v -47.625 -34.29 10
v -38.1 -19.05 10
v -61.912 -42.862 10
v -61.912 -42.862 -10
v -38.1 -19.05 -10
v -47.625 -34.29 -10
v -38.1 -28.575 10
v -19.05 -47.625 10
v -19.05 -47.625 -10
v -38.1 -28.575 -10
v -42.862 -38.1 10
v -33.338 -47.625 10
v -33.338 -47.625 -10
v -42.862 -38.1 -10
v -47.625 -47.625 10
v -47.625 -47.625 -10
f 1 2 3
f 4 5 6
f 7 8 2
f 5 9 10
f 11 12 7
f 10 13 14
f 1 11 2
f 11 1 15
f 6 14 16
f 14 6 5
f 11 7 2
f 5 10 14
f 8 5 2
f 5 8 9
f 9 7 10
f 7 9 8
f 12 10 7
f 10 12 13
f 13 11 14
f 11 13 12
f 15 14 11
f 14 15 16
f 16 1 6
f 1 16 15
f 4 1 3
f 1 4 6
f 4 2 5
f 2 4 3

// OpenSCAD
polyhedron(
    points=[
    [-38.1, -19.05, 10],
    [-19.05, -47.625, 10],
    [-38.1, -28.575, 10],
    [-33.3375, -47.625, 10],
    [-42.8625, -38.1, 10],
    [-47.625, -47.625, 10],
    [-47.625, -34.29, 10],
    [-61.9125, -42.8625, 10],
    [-38.1, -19.05, -10],
    [-19.05, -47.625, -10],
    [-38.1, -28.575, -10],
    [-33.3375, -47.625, -10],
    [-42.8625, -38.1, -10],
    [-47.625, -47.625, -10],
    [-47.625, -34.29, -10],
    [-61.9125, -42.8625, -10],
    ],
    faces=[
        [7,0,6],
        [14,8,15],
        [0,1,2],
        [10,9,8],
        [2,3,4],
        [12,11,10],
        [6,0,4,5],
        [13,12,8,14],
        [0,2,4],
        [12,10,8],
        [0,8,9,1],
        [1,9,10,2],
        [2,10,11,3],
        [3,11,12,4],
        [4,12,13,5],
        [5,13,14,6],
        [6,14,15,7],
        [7,15,8,0],
    ]
);
